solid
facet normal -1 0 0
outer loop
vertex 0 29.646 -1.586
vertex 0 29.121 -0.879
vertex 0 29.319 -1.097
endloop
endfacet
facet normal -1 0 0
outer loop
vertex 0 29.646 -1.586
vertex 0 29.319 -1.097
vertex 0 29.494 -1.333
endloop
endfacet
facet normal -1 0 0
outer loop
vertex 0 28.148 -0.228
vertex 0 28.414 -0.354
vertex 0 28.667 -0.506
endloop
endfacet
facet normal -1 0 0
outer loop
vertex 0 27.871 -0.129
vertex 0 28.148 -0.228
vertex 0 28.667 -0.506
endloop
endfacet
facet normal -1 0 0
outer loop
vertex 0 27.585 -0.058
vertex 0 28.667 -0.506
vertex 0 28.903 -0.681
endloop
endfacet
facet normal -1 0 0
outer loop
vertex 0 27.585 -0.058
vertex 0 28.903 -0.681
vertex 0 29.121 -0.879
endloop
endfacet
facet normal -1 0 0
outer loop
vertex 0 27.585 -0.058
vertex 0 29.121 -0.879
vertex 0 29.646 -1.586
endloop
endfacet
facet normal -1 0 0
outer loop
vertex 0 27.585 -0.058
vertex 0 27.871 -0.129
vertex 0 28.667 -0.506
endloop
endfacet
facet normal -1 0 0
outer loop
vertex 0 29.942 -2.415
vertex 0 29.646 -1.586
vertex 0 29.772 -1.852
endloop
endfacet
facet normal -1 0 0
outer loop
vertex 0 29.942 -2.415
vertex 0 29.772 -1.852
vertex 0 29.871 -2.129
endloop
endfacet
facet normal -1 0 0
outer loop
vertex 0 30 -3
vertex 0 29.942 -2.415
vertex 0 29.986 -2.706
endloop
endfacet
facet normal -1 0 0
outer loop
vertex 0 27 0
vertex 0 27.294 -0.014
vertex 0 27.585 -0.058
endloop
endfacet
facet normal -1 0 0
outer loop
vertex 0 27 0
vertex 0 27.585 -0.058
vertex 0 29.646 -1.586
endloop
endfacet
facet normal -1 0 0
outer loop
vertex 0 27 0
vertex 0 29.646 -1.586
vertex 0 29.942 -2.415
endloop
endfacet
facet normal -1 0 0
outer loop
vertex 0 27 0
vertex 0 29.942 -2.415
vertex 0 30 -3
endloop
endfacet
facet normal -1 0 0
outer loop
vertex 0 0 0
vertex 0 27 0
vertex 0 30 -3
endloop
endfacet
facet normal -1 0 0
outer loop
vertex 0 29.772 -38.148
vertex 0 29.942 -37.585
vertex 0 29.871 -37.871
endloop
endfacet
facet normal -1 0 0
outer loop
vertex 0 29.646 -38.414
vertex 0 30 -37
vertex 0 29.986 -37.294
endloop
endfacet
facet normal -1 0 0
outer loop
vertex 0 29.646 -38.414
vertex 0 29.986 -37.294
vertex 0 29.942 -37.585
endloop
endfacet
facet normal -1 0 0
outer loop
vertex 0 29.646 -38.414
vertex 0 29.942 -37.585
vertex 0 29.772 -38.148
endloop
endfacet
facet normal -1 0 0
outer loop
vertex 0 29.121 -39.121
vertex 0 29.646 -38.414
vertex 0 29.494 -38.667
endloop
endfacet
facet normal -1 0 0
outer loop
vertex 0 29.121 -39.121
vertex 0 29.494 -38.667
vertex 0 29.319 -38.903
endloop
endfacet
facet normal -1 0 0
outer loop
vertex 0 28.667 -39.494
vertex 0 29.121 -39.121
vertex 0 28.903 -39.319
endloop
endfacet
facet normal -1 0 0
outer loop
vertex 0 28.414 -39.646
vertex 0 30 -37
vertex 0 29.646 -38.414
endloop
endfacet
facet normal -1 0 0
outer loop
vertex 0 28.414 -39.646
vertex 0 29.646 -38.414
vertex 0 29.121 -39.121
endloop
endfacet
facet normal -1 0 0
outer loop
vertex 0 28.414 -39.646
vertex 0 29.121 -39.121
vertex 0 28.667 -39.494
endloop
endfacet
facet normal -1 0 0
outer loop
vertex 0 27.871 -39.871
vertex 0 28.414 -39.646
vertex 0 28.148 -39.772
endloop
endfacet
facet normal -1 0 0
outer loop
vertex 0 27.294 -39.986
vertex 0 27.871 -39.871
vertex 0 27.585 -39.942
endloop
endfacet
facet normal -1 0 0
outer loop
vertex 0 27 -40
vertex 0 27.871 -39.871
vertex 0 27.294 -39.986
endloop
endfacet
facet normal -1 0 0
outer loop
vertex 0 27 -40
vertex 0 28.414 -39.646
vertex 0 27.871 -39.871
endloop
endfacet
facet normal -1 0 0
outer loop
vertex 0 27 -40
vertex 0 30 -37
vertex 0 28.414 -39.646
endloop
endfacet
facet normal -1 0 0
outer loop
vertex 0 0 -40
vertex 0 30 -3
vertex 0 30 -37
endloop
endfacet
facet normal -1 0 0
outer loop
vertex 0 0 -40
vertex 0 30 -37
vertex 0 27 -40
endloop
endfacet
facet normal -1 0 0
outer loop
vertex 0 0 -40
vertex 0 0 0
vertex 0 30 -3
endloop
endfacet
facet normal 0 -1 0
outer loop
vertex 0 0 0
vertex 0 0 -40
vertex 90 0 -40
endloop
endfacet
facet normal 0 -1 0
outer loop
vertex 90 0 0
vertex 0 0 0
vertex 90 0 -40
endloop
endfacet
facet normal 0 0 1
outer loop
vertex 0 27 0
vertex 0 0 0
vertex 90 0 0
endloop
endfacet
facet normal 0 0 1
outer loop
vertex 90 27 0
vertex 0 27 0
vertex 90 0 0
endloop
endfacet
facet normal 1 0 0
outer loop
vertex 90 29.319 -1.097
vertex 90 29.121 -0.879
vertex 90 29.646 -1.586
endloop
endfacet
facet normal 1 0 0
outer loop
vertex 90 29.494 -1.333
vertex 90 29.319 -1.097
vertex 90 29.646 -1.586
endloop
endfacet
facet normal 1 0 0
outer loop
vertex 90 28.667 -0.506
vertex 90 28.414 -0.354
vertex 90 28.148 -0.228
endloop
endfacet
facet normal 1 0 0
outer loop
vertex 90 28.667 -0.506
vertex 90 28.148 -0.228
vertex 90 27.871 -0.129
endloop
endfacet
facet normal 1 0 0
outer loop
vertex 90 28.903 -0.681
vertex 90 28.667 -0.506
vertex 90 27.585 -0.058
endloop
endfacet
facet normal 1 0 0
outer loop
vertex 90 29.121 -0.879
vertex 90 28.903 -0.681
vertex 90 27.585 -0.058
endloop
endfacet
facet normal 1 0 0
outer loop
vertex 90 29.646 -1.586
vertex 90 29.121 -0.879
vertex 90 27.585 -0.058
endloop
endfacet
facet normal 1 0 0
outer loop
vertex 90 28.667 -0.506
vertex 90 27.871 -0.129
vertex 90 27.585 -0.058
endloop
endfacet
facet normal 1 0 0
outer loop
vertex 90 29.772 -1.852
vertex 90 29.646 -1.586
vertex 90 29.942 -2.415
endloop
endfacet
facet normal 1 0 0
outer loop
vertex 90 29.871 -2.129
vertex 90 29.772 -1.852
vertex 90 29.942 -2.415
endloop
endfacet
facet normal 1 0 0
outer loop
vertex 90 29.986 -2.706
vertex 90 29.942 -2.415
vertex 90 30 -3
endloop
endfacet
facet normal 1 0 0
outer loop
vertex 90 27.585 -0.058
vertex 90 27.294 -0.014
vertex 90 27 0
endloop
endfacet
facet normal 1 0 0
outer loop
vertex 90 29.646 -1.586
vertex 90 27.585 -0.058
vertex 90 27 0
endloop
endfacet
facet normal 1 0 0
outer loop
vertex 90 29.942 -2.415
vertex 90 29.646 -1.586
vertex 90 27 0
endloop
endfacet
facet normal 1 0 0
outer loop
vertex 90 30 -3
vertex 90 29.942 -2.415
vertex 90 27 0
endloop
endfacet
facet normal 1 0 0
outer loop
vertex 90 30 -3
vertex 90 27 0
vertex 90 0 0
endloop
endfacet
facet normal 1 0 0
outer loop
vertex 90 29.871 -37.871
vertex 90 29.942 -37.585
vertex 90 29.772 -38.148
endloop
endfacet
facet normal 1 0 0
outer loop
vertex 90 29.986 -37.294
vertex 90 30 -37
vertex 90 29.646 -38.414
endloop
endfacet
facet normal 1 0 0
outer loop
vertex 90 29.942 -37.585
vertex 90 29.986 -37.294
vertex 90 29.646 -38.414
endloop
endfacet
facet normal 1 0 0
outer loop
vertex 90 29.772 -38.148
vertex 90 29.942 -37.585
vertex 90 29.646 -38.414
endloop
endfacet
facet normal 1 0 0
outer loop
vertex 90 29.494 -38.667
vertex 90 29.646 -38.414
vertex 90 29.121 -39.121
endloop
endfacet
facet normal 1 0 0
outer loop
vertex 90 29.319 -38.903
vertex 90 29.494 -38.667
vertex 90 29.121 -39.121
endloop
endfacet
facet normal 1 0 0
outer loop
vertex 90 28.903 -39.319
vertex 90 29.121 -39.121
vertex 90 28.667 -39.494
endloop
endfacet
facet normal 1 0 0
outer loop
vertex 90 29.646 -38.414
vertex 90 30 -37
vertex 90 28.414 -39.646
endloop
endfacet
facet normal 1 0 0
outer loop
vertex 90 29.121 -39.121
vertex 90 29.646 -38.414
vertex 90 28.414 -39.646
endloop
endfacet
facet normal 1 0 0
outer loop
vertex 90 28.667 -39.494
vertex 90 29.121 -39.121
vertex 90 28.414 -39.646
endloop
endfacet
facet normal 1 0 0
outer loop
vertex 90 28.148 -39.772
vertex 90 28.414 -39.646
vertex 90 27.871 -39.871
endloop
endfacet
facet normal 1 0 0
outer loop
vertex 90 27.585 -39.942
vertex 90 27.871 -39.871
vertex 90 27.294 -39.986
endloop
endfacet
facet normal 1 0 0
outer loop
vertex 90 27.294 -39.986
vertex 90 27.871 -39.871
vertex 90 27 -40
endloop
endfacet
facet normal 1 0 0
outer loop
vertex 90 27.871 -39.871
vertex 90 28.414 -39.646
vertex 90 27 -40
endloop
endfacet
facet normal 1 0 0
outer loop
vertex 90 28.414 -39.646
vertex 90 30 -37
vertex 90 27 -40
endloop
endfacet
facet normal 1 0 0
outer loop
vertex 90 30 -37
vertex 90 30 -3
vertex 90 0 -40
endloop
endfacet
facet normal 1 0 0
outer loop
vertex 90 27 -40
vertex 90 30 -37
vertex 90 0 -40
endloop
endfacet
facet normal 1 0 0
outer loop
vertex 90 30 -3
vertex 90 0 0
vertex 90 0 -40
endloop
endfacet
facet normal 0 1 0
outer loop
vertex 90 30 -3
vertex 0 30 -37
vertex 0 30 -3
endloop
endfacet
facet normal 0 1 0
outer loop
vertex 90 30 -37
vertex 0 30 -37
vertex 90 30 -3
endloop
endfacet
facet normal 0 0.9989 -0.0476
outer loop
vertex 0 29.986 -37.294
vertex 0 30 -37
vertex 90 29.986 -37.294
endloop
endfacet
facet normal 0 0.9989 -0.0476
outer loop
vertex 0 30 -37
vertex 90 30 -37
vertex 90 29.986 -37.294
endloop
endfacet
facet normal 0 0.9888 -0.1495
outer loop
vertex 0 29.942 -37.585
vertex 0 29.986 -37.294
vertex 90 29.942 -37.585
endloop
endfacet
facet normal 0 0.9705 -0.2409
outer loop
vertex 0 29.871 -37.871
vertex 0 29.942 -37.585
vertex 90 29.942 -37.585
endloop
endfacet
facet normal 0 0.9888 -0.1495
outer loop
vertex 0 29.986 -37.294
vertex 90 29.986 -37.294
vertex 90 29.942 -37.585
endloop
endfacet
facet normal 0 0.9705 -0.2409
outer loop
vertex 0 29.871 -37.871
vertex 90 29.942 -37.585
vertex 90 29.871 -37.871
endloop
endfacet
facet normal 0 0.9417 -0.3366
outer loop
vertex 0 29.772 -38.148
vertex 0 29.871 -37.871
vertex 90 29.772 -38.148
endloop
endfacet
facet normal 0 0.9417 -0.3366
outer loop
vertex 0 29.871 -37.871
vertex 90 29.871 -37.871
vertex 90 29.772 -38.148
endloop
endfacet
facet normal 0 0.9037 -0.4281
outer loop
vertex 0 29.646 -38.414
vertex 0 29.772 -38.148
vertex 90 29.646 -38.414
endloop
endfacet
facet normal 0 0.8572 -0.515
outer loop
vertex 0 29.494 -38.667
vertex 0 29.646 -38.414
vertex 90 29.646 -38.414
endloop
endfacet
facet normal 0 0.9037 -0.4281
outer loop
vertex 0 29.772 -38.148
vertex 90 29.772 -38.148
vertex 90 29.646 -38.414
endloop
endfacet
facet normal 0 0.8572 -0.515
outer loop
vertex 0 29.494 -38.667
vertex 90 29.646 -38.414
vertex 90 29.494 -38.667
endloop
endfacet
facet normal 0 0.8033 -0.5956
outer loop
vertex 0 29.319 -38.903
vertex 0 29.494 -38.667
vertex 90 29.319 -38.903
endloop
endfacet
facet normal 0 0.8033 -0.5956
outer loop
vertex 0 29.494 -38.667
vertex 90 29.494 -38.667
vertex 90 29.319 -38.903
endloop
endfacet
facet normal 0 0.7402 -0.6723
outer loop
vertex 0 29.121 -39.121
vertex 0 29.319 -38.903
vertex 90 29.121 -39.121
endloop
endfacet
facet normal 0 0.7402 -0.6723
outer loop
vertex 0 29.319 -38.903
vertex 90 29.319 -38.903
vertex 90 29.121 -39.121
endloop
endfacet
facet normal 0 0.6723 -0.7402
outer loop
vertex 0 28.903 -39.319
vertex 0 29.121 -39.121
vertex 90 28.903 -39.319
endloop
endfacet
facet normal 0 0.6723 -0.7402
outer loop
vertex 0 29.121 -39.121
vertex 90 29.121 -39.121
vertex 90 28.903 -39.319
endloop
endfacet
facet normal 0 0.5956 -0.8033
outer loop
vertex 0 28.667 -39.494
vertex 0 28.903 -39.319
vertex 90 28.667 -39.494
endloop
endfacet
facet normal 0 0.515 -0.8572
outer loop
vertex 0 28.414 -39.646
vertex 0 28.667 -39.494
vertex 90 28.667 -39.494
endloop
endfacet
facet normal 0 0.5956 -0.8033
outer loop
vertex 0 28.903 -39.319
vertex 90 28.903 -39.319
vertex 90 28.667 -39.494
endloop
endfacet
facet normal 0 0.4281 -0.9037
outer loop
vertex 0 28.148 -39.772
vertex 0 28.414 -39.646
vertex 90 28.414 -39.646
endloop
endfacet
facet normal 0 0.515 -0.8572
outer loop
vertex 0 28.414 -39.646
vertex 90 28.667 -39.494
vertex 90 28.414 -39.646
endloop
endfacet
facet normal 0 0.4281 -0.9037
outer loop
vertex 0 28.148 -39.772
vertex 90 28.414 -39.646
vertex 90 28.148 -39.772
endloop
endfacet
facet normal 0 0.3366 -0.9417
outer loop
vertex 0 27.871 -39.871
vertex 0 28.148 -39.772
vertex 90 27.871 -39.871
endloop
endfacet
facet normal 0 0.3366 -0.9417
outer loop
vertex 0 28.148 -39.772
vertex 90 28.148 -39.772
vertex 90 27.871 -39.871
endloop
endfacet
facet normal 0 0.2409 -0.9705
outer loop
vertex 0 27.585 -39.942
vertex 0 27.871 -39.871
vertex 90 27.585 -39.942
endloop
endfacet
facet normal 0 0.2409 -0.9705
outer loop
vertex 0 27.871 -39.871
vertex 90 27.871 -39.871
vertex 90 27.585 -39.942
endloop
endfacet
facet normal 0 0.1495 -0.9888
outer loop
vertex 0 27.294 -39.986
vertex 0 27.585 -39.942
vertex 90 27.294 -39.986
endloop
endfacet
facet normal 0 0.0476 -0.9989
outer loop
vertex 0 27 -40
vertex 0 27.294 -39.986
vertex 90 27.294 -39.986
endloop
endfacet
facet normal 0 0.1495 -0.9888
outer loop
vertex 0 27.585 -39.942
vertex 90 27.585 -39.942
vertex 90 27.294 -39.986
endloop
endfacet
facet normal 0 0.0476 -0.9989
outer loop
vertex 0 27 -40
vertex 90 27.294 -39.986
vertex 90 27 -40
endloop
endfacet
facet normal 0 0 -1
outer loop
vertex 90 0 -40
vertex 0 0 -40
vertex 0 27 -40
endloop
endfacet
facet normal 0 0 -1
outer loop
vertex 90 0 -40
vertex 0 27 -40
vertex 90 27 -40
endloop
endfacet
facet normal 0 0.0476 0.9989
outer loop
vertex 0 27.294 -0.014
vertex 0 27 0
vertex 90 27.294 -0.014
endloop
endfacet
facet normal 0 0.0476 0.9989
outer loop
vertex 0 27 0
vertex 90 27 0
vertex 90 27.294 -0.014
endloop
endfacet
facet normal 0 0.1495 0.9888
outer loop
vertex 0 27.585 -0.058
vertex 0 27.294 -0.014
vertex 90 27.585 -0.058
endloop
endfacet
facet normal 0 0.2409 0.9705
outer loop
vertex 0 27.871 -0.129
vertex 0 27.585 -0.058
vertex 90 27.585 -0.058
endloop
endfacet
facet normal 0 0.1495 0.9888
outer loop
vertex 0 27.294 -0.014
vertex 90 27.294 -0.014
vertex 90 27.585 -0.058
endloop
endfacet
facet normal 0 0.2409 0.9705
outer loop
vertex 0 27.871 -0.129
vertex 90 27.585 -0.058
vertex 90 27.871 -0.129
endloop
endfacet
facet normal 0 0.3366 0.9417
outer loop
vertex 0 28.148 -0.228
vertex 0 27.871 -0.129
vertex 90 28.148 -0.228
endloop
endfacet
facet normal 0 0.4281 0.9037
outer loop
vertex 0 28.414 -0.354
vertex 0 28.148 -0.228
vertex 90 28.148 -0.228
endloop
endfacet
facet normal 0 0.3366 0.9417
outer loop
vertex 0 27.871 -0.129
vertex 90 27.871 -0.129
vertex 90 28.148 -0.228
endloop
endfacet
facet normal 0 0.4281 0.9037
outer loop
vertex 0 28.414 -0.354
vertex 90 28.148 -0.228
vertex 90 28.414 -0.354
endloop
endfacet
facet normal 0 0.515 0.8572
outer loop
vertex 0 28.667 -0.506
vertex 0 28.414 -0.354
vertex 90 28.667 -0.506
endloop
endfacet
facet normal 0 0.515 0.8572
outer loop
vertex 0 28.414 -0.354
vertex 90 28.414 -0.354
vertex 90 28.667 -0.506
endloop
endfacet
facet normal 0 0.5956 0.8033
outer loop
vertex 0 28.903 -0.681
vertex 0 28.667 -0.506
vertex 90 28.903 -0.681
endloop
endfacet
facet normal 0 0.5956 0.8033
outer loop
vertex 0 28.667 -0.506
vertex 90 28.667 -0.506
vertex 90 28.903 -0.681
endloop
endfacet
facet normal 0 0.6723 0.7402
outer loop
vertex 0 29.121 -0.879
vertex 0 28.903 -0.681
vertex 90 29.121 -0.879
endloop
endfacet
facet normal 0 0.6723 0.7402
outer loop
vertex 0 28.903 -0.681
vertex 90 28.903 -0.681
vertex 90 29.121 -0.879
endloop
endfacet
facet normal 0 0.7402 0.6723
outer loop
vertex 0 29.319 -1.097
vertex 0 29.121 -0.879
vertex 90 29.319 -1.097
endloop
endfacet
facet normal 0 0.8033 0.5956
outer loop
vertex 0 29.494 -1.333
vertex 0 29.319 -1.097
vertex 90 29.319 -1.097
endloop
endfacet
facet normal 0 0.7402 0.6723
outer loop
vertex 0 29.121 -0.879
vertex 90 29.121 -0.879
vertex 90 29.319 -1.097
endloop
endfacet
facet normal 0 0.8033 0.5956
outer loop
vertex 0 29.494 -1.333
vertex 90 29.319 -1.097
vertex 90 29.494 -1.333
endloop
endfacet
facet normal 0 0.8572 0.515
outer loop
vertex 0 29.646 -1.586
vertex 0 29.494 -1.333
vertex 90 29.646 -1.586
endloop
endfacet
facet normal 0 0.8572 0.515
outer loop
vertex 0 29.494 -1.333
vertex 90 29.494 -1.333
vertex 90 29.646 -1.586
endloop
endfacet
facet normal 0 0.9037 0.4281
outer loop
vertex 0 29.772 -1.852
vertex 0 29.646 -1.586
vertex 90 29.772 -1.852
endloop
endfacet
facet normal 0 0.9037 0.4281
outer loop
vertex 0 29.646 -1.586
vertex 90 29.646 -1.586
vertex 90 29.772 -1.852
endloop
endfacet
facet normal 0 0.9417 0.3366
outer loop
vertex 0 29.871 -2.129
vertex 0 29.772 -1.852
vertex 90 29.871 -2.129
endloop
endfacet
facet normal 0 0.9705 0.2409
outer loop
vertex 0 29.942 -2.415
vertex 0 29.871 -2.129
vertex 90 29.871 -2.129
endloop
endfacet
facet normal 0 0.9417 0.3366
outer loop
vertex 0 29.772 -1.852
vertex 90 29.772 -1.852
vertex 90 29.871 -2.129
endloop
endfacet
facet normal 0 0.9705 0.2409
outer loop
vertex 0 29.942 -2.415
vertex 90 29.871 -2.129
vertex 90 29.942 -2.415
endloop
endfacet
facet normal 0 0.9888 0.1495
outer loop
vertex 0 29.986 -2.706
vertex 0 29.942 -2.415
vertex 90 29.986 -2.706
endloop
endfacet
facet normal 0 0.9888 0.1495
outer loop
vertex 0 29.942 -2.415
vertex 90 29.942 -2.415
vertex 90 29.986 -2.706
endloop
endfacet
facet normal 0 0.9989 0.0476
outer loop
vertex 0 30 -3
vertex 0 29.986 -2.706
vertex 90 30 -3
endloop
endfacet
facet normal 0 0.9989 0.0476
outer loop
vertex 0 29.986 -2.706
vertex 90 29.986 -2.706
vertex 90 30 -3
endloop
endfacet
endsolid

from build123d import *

# Parameters (mm, degrees)
SKETCH1_W           = 90
SKETCH1_H           = 40
BOSS_EXTRUDE1_DEPTH = 30
FILLET1_R           = 3
FILLET2_R           = 3


with BuildPart() as part:
    # Sketch1 → Boss-Extrude1 (new body)
    with BuildSketch(Plane(origin=(0, 0, 0), x_dir=(1, 0, 0), z_dir=(0, 1, 0))):
        with Locations((45, 20)):
            Rectangle(SKETCH1_W, SKETCH1_H)
    extrude(amount=BOSS_EXTRUDE1_DEPTH)

    # Fillet1
    fillet1_edges = [part.edges().sort_by_distance(p)[0] for p in [
        (45, 30, 0),
    ]]
    fillet(fillet1_edges, radius=FILLET1_R)

    # Fillet2
    fillet2_edges = [part.edges().sort_by_distance(p)[0] for p in [
        (45, 30, -40),
    ]]
    fillet(fillet2_edges, radius=FILLET2_R)


solid = part.part
